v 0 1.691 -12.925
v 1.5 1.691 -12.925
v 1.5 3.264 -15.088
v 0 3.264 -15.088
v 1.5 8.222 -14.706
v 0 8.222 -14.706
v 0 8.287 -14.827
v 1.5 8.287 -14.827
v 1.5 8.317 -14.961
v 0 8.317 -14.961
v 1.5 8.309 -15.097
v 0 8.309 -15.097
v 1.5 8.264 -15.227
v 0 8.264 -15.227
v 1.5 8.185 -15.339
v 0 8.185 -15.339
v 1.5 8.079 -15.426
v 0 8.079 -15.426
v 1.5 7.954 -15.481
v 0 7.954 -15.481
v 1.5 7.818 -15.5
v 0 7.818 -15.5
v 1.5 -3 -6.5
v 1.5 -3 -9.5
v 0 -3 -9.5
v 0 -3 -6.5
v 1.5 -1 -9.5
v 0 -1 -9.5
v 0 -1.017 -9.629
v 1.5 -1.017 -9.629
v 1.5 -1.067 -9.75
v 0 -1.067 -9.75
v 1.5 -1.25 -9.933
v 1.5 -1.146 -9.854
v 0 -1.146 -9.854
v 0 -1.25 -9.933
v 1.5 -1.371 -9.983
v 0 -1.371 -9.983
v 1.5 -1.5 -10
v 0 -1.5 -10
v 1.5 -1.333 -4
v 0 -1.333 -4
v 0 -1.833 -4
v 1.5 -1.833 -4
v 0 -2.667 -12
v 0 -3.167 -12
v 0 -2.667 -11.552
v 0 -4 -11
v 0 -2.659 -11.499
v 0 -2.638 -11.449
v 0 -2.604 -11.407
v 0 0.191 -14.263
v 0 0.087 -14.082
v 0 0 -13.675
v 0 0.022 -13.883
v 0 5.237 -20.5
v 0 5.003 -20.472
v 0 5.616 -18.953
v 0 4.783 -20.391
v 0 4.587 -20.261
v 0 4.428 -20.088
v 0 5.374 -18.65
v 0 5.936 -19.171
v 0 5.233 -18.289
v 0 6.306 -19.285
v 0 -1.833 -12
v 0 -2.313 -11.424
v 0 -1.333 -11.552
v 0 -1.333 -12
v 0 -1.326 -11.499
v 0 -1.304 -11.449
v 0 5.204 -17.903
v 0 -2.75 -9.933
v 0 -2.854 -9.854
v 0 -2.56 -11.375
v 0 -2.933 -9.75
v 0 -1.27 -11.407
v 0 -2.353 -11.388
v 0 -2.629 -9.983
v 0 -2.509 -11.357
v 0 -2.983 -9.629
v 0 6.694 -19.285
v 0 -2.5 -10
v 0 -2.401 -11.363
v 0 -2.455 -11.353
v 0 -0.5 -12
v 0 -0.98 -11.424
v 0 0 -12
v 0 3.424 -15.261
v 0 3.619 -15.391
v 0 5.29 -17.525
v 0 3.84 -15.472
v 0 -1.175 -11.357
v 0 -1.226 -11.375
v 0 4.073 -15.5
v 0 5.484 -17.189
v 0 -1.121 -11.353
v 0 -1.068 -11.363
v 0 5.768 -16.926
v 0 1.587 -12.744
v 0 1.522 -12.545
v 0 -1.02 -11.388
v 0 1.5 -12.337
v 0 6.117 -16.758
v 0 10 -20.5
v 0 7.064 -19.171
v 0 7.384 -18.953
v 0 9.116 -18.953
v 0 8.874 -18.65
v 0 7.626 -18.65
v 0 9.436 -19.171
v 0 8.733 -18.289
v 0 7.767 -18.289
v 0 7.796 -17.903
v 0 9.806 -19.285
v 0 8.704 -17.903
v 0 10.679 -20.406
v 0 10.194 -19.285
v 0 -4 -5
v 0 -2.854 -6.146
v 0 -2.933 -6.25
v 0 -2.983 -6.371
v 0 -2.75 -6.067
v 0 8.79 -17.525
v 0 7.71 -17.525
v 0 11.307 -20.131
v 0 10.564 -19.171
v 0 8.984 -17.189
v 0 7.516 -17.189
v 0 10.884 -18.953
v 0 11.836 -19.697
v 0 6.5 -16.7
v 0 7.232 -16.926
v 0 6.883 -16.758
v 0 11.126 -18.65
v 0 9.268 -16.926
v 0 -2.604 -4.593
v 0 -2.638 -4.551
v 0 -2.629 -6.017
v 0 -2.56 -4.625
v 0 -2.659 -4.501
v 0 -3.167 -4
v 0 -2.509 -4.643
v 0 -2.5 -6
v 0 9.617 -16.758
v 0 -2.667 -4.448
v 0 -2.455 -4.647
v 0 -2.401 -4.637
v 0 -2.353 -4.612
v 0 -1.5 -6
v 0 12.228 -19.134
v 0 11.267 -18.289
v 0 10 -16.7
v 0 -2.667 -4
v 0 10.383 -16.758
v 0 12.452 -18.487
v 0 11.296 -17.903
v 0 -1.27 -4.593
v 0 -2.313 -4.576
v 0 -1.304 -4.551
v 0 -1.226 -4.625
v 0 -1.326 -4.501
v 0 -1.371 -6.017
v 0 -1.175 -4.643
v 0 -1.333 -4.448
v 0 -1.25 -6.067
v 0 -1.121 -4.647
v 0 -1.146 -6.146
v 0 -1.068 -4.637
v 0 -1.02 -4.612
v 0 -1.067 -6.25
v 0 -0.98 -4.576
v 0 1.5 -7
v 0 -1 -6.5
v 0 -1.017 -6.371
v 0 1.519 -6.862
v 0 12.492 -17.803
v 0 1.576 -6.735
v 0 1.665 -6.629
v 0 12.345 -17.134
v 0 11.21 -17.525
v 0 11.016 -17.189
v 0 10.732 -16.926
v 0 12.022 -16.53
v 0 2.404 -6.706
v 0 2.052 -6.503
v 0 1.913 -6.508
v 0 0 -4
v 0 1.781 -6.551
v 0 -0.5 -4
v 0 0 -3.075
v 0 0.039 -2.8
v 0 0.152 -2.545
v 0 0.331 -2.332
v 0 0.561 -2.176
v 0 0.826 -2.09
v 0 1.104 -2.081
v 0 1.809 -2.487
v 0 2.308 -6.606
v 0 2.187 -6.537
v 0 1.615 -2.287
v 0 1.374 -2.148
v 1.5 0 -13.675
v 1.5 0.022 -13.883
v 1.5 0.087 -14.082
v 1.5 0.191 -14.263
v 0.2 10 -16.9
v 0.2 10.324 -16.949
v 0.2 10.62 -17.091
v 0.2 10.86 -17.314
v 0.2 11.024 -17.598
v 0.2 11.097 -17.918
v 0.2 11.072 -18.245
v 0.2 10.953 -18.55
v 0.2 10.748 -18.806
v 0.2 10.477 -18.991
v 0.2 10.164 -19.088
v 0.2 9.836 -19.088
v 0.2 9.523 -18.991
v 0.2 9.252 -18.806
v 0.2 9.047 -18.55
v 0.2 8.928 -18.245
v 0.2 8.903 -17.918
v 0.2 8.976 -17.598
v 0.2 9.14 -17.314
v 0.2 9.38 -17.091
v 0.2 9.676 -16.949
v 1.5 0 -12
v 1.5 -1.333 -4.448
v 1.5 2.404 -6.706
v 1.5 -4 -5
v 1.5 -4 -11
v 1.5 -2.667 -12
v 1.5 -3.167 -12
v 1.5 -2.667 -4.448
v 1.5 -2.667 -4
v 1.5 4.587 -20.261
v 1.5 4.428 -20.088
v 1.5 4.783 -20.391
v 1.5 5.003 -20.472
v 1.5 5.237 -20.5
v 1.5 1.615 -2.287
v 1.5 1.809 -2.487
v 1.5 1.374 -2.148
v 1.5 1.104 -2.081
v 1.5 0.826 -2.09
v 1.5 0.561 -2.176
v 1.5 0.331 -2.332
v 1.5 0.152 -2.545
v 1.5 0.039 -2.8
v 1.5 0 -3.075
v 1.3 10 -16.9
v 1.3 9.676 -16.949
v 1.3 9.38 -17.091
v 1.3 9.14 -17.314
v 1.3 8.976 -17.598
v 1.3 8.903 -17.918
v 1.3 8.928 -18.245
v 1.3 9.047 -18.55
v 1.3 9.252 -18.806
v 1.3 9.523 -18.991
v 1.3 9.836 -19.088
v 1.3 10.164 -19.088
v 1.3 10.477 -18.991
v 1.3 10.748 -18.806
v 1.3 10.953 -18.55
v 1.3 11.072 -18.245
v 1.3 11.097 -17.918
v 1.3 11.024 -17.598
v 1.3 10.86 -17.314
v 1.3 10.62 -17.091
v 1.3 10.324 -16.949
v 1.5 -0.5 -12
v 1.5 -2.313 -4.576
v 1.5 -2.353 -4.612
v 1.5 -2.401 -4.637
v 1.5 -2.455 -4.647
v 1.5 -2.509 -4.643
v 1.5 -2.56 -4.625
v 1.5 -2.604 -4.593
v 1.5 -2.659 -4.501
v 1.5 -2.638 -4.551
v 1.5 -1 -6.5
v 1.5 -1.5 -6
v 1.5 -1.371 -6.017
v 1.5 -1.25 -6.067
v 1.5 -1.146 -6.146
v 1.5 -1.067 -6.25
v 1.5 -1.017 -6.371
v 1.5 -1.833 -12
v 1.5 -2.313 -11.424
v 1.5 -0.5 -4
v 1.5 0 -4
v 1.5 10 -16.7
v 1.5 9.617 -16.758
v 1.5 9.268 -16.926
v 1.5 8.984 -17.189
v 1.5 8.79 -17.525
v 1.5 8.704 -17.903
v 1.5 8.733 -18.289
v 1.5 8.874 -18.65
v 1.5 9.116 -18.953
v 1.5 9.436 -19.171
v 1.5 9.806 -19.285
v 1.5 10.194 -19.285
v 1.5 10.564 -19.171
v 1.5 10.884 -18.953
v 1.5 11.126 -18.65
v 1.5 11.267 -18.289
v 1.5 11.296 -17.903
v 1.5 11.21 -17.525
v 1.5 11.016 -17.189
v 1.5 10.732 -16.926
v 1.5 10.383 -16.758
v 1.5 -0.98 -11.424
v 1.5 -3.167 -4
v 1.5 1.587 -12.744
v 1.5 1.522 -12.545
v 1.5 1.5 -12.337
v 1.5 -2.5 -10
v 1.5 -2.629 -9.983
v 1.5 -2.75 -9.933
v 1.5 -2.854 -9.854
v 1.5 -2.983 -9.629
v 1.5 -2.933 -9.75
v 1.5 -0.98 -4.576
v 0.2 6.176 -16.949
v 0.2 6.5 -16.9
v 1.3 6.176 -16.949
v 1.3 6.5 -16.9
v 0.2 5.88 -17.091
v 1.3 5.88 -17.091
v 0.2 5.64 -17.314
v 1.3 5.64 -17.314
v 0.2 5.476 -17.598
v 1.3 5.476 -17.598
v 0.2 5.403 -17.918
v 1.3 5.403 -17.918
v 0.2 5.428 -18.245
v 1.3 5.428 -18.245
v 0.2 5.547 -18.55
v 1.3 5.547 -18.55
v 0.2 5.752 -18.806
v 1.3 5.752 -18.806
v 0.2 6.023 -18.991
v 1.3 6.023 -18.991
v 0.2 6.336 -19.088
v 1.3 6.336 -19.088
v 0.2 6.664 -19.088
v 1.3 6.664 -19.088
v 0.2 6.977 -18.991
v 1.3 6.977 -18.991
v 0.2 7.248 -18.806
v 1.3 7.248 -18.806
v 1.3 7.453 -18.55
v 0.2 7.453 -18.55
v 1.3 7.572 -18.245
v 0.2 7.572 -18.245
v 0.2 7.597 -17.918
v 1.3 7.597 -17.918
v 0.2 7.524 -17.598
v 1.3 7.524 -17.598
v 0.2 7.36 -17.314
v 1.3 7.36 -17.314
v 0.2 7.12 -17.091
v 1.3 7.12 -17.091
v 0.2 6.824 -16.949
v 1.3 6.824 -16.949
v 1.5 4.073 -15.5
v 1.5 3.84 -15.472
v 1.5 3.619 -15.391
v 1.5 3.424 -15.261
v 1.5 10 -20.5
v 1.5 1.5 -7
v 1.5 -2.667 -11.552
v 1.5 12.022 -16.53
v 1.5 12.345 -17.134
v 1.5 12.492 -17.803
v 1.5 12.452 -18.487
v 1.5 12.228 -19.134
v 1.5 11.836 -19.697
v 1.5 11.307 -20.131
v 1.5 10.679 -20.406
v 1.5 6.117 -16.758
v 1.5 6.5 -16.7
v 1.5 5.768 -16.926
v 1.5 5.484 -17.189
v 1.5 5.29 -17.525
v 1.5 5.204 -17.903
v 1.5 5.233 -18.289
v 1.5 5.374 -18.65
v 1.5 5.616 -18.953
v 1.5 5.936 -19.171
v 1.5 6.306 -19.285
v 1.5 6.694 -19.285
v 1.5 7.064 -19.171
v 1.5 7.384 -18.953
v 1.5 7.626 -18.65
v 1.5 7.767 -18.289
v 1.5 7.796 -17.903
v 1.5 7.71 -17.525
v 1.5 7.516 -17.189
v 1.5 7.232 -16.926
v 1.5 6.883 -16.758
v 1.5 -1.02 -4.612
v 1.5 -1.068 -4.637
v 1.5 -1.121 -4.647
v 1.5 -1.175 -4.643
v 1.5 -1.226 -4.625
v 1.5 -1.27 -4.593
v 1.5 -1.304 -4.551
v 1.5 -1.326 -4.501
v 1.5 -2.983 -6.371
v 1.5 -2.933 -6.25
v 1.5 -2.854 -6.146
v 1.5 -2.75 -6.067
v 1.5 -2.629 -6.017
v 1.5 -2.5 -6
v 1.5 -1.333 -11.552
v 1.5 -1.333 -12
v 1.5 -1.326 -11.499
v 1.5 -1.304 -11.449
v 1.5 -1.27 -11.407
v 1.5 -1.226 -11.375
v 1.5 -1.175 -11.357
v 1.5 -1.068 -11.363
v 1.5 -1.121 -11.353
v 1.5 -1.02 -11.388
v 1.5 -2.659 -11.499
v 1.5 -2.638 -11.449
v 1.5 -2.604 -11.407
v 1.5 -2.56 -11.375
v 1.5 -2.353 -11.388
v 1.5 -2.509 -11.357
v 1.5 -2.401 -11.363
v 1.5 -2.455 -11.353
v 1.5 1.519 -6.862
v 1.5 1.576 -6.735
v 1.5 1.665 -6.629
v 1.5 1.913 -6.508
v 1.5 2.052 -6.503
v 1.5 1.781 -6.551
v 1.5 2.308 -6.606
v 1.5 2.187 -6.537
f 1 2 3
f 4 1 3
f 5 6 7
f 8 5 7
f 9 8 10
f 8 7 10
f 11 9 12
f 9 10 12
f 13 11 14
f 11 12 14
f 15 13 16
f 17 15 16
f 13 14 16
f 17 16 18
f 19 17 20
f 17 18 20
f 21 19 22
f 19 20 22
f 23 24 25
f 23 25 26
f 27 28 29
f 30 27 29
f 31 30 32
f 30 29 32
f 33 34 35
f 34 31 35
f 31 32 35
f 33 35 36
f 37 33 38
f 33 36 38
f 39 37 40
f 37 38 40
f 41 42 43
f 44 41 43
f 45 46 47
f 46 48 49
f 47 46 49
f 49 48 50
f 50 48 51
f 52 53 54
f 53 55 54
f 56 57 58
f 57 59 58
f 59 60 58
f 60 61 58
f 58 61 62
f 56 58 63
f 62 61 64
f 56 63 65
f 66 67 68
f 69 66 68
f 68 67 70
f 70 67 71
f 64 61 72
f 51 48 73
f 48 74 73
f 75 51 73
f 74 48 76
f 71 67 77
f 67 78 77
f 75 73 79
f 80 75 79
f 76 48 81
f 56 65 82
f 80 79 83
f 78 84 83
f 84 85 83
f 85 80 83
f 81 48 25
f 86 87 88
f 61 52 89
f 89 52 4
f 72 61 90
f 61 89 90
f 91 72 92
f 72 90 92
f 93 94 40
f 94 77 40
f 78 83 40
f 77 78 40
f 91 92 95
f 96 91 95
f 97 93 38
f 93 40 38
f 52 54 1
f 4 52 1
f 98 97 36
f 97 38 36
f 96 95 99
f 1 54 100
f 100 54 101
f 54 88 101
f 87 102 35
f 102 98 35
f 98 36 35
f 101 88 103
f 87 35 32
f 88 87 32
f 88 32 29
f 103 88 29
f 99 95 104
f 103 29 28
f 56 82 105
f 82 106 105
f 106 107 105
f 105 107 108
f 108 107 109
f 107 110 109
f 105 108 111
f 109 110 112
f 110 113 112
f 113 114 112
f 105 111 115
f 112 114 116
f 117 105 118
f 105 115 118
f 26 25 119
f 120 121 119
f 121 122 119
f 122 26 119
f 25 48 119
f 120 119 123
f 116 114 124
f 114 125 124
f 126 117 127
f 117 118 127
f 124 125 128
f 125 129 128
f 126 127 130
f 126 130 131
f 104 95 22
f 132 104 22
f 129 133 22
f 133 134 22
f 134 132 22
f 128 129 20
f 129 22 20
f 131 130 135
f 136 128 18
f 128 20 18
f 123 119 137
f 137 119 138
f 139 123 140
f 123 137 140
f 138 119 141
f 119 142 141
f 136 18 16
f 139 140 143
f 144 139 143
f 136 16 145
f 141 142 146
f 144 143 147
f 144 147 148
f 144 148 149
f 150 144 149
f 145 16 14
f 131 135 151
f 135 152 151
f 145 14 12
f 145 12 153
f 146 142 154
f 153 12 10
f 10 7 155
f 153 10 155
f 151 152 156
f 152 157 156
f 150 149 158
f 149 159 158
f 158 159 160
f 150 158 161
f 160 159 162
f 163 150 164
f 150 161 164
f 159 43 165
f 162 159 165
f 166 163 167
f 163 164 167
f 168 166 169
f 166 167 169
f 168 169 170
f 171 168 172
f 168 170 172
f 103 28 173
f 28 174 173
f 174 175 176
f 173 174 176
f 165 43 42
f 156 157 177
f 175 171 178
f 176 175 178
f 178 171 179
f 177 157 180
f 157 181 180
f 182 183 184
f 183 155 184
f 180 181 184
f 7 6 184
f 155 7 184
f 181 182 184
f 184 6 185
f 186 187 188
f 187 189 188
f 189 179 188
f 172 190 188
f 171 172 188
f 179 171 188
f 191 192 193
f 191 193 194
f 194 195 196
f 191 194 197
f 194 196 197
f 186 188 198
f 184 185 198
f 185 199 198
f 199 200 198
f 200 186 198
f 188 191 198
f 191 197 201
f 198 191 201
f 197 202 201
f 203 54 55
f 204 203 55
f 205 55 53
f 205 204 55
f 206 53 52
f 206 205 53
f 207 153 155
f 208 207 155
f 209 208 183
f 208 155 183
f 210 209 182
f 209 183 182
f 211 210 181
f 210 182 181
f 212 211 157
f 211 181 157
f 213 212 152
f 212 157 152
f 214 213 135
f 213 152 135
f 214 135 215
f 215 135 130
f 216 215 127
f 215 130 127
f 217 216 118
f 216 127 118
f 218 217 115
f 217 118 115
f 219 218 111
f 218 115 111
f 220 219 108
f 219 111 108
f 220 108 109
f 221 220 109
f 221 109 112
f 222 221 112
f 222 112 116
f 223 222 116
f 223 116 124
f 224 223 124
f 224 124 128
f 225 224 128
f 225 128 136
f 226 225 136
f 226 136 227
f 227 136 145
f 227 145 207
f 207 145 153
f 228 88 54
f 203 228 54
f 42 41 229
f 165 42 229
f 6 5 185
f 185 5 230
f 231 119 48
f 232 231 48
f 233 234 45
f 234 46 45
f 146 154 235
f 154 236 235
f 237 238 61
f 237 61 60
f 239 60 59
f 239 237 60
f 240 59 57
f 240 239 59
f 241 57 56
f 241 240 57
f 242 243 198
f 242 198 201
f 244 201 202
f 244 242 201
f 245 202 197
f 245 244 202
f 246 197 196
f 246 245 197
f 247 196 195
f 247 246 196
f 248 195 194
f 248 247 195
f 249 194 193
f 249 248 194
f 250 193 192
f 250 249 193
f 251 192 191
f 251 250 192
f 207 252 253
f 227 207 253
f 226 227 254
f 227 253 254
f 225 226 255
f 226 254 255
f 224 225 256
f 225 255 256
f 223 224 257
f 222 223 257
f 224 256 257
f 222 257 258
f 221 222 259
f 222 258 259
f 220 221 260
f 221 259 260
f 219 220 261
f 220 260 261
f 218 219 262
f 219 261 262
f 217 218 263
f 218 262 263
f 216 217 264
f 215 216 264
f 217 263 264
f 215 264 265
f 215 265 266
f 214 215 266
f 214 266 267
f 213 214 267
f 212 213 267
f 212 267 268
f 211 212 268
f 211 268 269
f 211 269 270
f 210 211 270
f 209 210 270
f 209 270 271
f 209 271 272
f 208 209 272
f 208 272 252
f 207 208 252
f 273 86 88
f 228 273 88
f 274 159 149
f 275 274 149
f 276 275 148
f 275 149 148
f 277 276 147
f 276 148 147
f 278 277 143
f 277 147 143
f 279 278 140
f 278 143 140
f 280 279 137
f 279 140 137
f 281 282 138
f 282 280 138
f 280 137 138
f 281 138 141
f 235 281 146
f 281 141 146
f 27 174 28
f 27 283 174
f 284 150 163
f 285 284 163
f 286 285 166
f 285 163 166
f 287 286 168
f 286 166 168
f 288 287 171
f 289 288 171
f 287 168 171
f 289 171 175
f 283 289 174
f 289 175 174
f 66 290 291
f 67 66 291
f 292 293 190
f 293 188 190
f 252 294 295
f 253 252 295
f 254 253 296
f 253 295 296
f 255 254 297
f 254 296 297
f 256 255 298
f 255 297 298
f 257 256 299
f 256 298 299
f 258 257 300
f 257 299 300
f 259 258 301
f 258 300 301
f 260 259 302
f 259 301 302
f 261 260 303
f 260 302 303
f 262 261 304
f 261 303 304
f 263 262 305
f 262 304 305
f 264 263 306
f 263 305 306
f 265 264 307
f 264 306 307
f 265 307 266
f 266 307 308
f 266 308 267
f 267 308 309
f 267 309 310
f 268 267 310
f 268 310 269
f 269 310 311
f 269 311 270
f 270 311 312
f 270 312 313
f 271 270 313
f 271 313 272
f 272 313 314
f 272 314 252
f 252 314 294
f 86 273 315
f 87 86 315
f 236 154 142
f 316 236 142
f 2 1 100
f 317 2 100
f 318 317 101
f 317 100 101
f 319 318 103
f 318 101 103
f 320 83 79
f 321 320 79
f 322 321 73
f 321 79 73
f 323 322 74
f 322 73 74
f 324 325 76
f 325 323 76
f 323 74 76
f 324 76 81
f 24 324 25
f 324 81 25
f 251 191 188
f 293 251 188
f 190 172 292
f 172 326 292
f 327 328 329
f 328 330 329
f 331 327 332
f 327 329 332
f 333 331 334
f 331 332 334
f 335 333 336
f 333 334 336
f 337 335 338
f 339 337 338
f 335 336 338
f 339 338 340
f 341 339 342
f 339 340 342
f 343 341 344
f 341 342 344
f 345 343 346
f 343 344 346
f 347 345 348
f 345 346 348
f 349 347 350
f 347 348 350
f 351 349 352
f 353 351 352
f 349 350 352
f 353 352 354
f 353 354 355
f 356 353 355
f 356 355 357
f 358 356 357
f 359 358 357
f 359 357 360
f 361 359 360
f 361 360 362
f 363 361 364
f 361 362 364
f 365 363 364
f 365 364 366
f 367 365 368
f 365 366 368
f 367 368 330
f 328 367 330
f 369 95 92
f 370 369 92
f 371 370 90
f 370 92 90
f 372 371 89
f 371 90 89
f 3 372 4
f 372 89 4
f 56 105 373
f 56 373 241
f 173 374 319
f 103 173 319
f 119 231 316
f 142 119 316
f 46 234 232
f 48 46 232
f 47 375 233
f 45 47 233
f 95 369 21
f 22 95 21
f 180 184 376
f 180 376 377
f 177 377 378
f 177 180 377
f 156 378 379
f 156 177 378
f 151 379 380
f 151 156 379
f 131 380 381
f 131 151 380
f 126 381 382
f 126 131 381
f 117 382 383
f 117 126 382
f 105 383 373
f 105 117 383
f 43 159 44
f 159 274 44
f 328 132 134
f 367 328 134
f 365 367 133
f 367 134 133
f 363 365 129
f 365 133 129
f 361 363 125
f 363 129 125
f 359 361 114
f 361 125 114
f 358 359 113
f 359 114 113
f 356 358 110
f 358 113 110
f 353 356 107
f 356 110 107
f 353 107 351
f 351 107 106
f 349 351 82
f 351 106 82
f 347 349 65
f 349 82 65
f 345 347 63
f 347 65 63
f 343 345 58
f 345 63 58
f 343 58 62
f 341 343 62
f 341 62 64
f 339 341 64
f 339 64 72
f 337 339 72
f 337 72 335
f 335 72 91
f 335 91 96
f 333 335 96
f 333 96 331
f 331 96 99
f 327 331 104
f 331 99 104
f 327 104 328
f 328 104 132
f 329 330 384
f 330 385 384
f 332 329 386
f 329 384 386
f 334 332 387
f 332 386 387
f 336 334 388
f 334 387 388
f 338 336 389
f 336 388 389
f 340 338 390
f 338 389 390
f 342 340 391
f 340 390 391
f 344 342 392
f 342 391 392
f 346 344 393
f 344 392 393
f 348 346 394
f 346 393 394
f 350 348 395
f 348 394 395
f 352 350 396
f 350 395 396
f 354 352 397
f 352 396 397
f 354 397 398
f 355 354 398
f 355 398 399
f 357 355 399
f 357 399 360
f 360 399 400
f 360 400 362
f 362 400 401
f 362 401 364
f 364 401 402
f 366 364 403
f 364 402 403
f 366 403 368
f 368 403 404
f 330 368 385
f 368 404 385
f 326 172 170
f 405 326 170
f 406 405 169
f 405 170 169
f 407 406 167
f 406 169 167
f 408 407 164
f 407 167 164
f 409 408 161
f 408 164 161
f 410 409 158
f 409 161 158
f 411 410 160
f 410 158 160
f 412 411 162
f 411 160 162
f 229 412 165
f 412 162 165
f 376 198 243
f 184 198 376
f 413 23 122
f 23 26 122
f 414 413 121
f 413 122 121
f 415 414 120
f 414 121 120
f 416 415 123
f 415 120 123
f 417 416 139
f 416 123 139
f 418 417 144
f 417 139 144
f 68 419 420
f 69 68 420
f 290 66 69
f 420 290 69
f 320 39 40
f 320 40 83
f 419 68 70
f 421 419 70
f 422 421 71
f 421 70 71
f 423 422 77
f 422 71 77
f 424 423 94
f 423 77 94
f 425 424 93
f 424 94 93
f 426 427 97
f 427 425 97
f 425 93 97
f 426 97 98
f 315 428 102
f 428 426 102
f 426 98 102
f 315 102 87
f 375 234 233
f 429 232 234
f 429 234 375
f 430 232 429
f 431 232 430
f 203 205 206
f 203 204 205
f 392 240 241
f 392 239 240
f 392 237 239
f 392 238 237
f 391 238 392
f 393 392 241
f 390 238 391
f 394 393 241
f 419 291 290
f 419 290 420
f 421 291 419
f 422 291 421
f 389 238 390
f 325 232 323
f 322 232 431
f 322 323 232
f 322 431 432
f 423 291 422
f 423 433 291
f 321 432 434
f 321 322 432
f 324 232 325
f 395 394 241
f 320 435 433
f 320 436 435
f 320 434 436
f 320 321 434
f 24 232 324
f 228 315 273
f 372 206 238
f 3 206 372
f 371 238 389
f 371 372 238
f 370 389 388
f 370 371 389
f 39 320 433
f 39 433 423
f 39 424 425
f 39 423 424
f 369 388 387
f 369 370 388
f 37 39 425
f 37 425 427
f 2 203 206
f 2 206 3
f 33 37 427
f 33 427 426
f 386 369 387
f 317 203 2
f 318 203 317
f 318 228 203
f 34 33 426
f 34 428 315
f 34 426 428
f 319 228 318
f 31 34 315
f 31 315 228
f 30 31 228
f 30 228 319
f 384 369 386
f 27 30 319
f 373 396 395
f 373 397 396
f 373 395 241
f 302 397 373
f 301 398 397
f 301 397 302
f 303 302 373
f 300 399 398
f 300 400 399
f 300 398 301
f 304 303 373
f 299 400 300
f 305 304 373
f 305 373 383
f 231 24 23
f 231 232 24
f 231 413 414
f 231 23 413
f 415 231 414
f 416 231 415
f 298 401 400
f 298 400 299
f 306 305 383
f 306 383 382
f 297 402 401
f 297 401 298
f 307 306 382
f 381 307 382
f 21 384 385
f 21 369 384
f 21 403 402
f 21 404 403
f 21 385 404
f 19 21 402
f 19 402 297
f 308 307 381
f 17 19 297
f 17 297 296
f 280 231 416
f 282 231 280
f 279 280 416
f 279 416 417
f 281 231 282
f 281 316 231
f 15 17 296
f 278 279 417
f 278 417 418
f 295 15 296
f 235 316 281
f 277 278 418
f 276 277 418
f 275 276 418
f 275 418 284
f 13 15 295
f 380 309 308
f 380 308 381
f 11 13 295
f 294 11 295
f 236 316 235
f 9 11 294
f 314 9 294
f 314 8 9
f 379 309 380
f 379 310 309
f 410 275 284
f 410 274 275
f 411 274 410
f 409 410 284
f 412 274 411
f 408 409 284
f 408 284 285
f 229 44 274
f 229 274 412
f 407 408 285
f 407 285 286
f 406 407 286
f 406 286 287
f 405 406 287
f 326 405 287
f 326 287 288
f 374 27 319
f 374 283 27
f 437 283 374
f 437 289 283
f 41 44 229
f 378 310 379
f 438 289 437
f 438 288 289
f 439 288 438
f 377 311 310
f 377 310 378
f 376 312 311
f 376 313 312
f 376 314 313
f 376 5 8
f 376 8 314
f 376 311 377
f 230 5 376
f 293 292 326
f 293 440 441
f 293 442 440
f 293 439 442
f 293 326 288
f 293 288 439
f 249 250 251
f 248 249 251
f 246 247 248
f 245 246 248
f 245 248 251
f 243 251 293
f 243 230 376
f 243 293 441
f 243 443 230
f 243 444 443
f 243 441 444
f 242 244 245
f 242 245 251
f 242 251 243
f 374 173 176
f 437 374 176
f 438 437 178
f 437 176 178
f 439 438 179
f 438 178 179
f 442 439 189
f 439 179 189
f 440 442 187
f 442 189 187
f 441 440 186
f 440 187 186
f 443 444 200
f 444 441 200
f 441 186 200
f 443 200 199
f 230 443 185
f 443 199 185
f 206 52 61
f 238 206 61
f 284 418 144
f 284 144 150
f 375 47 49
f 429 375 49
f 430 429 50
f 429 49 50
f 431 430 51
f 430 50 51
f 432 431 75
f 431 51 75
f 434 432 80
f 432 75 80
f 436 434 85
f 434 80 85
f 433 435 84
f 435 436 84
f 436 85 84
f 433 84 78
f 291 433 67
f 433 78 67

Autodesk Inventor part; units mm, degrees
ref_plane "YZ Plane" through (0, 0, 0) normal (1, 0, 0) x (0, 1, 0)
ref_plane "XZ Plane" through (0, 0, 0) normal (0, 1, 0) x (-1, 0, 0)
sketch "Sketch1" plane through (0, 0, 0) normal (1, 0, 0) x (0, 1, 0)
  line L0 (0, 0) -> (12.0218, -16.5295)
  line L1 (10, -20.5) -> (4.7274, -20.5)
  line L2 (0, -14) -> (4.7274, -20.5)
  line L3 (0, 0) -> (0, -4)
  line L4 (0, -4) -> (-4, -4)
  line L5 (-4, -4) -> (-4, -12)
  line L6 (-4, -12) -> (0, -12)
  line L7 (0, -12) -> (0, -14)
  arc A0 (10, -20.5) -> (12.0218, -16.5295) centre (10, -18) ccw
  point P0 (14.9095, -20.5)
  point P1 (6.5, -18)
  dimension "d26" = 8
  dimension "d31" = 4
  dimension "d32" = 2
  dimension "d43" = 2.5
  dimension "d45" = 10
  dimension "d64" = 3.5
  dimension "d65" = 4
  dimension "d78" = 18
extrude "Extrusion1" add sketch "Sketch1" along normal blind 1.5
hole "Hole3" at (0, 10, -18) at (0, 6.5, -18) direction (1, 0, 0) diameter 2.2 end through all
fillet "Fillet3" radius 1 3 edges at (0.75, 0, 0) (0.75, 4.7274, -20.5) (0.75, 0, -14)
chamfer "Chamfer2" distance 0.2 angle 45 4 edges at (1.5, 6.5, -19.1) (1.5, 10, -19.1) (0, 6.5, -19.1) (0, 10, -19.1)
ref_plane "Work Plane1" through (0, -4, -8) normal (0, 0, -1) x (-1, 0, 0)
sketch "Sketch4" plane through (1.5, 0, 0) normal (1, 0, 0) x (0, 0, -1)
  arc A0 (2.4869, 1.8087) -> (3.0751, 0) centre (3.0751, 1) ccw projected
  line L0 (3.0751, 0) -> (4, 0) projected
  line L1 (4, 0) -> (4, -4) projected
  line L2 (4, -4) -> (12, -4) projected
  line L3 (12, -4) -> (12, 0) projected
  line L4 (12, 0) -> (13.6748, 0) projected
  line L5 (14.263, 0.1913) -> (20.0882, 4.4279) projected
  line L6 (20.5, 5.2366) -> (20.5, 10) projected
  arc A1 (20.5, 10) -> (16.5295, 12.0218) centre (18, 10) ccw projected
  line L7 (16.5295, 12.0218) -> (2.4869, 1.8087) projected
  circle A2 centre (18, 10) radius 1.3 projected
  line L8 (4, 0) -> (12, 0)
  line L9 (12, -4) -> (4, -4) projected
  line L10 (5, -4) -> (4, -3.1667)
  line L11 (4, -4) -> (4, 0) projected
  line L12 (4, -2.6667) -> (5, -2.6667)
  line L13 (5, -2.6667) -> (4, -1.8333)
  line L14 (4, -1.3333) -> (5, -1.3333)
  line L15 (5, -1.3333) -> (4, -0.5)
  line L16 (4, -0.5) -> (4, 0)
  line L17 (4, -0.5) -> (4, -1.3333)
  line L18 (4, -1.8333) -> (4, -2.6667)
  line L19 (4, -3.1667) -> (4, -4)
  line L20 (4, -4) -> (5, -4)
  arc A3 (13.6748, 0) -> (14.263, 0.1913) centre (13.6748, 1) ccw projected
  arc A4 (20.0882, 4.4279) -> (20.5, 5.2366) centre (19.5, 5.2366) ccw projected
  point P0 (0, 0)
  dimension "d57" = 1
  dimension "d58" = 0.5
  dimension "d59" = 0.5
  dimension "d60" = 0.5
extrude "Extrusion2" cut sketch "Sketch4" against normal through all contours L15 L14 L1 | L13 L12 L1 | L2 L1 L10
mirror "Mirror1" about plane through (0, -4, -8) normal (0, 0, -1) of "Extrusion2"
fillet "Fillet4" radius 0.2 4 edges at (0.75, -1.3333, -11) (0.75, -2.6667, -11) (0.75, -1.3333, -5) (0.75, -2.6667, -5)
sketch "Sketch5" plane through (1.5, 0, 0) normal (1, 0, 0) x (0, 0, -1)
  line L0 (5.4627, 1.5) -> (12.6621, 1.5)
  line L1 (12.6621, 1.5) -> (15.5, 3.564)
  line L2 (15.5, 3.564) -> (15.5, 8.8)
  line L3 (15.5, 8.8) -> (5.4627, 1.5)
  line L4 (16.5295, 12.0218) -> (2.4869, 1.8087) projected
  circle A0 centre (18, 6.5) radius 1.3 projected
  line L5 (14.263, 0.1913) -> (20.0882, 4.4279) projected
  line L6 (12, 0) -> (13.6748, 0) projected
  line L7 (6, -1) -> (10, -1)
  line L8 (10, -1) -> (10, -3)
  line L9 (10, -3) -> (6, -3)
  line L10 (6, -3) -> (6, -1)
  line L11 (5, -4) -> (11, -4) projected
  line L12 (12, -0.5) -> (12, 0) projected
  line L13 (4, 0) -> (4, -0.5) projected
  point P0 (0, 0)
  point P1 (14, 0)
  point P2 (21.5, 5.144)
  dimension "d66" = 2.5
  dimension "d67" = 2
  dimension "d68" = 2
  dimension "d69" = 1.5
  dimension "d74" = 1
  dimension "d75" = 1
  dimension "d76" = 2
  dimension "d77" = 2
extrude "Extrusion3" cut sketch "Sketch5" against normal through all contours L3 L2 L1 L0 | L7 L8 L9 L10
fillet "Fillet5" radius 0.5 6 edges at (0.75, 1.5, -5.4627) (0.75, 8.8, -15.5) (0.75, -3, -6) (0.75, -1, -6) (0.75, -1, -10) (0.75, -3, -10)
fillet "Fillet5" radius 1 2 edges at (0.75, 3.564, -15.5) (0.75, 1.5, -12.6621)
equation "\"d46\" = hole_diameter"
equation "\"d59\" = d58"
equation "\"d60\" = d58"
equation "\"d68\" = d67"
equation "\"d77\" = d76"
equation "\"d1\" = d0"
equation "\"d21\" = d1"
equation "\"hole_diameter\" = 2.2"
equation "\"d0\" = 12"
properties part number "M2_LINKAGE" material "ABS Plastic"
